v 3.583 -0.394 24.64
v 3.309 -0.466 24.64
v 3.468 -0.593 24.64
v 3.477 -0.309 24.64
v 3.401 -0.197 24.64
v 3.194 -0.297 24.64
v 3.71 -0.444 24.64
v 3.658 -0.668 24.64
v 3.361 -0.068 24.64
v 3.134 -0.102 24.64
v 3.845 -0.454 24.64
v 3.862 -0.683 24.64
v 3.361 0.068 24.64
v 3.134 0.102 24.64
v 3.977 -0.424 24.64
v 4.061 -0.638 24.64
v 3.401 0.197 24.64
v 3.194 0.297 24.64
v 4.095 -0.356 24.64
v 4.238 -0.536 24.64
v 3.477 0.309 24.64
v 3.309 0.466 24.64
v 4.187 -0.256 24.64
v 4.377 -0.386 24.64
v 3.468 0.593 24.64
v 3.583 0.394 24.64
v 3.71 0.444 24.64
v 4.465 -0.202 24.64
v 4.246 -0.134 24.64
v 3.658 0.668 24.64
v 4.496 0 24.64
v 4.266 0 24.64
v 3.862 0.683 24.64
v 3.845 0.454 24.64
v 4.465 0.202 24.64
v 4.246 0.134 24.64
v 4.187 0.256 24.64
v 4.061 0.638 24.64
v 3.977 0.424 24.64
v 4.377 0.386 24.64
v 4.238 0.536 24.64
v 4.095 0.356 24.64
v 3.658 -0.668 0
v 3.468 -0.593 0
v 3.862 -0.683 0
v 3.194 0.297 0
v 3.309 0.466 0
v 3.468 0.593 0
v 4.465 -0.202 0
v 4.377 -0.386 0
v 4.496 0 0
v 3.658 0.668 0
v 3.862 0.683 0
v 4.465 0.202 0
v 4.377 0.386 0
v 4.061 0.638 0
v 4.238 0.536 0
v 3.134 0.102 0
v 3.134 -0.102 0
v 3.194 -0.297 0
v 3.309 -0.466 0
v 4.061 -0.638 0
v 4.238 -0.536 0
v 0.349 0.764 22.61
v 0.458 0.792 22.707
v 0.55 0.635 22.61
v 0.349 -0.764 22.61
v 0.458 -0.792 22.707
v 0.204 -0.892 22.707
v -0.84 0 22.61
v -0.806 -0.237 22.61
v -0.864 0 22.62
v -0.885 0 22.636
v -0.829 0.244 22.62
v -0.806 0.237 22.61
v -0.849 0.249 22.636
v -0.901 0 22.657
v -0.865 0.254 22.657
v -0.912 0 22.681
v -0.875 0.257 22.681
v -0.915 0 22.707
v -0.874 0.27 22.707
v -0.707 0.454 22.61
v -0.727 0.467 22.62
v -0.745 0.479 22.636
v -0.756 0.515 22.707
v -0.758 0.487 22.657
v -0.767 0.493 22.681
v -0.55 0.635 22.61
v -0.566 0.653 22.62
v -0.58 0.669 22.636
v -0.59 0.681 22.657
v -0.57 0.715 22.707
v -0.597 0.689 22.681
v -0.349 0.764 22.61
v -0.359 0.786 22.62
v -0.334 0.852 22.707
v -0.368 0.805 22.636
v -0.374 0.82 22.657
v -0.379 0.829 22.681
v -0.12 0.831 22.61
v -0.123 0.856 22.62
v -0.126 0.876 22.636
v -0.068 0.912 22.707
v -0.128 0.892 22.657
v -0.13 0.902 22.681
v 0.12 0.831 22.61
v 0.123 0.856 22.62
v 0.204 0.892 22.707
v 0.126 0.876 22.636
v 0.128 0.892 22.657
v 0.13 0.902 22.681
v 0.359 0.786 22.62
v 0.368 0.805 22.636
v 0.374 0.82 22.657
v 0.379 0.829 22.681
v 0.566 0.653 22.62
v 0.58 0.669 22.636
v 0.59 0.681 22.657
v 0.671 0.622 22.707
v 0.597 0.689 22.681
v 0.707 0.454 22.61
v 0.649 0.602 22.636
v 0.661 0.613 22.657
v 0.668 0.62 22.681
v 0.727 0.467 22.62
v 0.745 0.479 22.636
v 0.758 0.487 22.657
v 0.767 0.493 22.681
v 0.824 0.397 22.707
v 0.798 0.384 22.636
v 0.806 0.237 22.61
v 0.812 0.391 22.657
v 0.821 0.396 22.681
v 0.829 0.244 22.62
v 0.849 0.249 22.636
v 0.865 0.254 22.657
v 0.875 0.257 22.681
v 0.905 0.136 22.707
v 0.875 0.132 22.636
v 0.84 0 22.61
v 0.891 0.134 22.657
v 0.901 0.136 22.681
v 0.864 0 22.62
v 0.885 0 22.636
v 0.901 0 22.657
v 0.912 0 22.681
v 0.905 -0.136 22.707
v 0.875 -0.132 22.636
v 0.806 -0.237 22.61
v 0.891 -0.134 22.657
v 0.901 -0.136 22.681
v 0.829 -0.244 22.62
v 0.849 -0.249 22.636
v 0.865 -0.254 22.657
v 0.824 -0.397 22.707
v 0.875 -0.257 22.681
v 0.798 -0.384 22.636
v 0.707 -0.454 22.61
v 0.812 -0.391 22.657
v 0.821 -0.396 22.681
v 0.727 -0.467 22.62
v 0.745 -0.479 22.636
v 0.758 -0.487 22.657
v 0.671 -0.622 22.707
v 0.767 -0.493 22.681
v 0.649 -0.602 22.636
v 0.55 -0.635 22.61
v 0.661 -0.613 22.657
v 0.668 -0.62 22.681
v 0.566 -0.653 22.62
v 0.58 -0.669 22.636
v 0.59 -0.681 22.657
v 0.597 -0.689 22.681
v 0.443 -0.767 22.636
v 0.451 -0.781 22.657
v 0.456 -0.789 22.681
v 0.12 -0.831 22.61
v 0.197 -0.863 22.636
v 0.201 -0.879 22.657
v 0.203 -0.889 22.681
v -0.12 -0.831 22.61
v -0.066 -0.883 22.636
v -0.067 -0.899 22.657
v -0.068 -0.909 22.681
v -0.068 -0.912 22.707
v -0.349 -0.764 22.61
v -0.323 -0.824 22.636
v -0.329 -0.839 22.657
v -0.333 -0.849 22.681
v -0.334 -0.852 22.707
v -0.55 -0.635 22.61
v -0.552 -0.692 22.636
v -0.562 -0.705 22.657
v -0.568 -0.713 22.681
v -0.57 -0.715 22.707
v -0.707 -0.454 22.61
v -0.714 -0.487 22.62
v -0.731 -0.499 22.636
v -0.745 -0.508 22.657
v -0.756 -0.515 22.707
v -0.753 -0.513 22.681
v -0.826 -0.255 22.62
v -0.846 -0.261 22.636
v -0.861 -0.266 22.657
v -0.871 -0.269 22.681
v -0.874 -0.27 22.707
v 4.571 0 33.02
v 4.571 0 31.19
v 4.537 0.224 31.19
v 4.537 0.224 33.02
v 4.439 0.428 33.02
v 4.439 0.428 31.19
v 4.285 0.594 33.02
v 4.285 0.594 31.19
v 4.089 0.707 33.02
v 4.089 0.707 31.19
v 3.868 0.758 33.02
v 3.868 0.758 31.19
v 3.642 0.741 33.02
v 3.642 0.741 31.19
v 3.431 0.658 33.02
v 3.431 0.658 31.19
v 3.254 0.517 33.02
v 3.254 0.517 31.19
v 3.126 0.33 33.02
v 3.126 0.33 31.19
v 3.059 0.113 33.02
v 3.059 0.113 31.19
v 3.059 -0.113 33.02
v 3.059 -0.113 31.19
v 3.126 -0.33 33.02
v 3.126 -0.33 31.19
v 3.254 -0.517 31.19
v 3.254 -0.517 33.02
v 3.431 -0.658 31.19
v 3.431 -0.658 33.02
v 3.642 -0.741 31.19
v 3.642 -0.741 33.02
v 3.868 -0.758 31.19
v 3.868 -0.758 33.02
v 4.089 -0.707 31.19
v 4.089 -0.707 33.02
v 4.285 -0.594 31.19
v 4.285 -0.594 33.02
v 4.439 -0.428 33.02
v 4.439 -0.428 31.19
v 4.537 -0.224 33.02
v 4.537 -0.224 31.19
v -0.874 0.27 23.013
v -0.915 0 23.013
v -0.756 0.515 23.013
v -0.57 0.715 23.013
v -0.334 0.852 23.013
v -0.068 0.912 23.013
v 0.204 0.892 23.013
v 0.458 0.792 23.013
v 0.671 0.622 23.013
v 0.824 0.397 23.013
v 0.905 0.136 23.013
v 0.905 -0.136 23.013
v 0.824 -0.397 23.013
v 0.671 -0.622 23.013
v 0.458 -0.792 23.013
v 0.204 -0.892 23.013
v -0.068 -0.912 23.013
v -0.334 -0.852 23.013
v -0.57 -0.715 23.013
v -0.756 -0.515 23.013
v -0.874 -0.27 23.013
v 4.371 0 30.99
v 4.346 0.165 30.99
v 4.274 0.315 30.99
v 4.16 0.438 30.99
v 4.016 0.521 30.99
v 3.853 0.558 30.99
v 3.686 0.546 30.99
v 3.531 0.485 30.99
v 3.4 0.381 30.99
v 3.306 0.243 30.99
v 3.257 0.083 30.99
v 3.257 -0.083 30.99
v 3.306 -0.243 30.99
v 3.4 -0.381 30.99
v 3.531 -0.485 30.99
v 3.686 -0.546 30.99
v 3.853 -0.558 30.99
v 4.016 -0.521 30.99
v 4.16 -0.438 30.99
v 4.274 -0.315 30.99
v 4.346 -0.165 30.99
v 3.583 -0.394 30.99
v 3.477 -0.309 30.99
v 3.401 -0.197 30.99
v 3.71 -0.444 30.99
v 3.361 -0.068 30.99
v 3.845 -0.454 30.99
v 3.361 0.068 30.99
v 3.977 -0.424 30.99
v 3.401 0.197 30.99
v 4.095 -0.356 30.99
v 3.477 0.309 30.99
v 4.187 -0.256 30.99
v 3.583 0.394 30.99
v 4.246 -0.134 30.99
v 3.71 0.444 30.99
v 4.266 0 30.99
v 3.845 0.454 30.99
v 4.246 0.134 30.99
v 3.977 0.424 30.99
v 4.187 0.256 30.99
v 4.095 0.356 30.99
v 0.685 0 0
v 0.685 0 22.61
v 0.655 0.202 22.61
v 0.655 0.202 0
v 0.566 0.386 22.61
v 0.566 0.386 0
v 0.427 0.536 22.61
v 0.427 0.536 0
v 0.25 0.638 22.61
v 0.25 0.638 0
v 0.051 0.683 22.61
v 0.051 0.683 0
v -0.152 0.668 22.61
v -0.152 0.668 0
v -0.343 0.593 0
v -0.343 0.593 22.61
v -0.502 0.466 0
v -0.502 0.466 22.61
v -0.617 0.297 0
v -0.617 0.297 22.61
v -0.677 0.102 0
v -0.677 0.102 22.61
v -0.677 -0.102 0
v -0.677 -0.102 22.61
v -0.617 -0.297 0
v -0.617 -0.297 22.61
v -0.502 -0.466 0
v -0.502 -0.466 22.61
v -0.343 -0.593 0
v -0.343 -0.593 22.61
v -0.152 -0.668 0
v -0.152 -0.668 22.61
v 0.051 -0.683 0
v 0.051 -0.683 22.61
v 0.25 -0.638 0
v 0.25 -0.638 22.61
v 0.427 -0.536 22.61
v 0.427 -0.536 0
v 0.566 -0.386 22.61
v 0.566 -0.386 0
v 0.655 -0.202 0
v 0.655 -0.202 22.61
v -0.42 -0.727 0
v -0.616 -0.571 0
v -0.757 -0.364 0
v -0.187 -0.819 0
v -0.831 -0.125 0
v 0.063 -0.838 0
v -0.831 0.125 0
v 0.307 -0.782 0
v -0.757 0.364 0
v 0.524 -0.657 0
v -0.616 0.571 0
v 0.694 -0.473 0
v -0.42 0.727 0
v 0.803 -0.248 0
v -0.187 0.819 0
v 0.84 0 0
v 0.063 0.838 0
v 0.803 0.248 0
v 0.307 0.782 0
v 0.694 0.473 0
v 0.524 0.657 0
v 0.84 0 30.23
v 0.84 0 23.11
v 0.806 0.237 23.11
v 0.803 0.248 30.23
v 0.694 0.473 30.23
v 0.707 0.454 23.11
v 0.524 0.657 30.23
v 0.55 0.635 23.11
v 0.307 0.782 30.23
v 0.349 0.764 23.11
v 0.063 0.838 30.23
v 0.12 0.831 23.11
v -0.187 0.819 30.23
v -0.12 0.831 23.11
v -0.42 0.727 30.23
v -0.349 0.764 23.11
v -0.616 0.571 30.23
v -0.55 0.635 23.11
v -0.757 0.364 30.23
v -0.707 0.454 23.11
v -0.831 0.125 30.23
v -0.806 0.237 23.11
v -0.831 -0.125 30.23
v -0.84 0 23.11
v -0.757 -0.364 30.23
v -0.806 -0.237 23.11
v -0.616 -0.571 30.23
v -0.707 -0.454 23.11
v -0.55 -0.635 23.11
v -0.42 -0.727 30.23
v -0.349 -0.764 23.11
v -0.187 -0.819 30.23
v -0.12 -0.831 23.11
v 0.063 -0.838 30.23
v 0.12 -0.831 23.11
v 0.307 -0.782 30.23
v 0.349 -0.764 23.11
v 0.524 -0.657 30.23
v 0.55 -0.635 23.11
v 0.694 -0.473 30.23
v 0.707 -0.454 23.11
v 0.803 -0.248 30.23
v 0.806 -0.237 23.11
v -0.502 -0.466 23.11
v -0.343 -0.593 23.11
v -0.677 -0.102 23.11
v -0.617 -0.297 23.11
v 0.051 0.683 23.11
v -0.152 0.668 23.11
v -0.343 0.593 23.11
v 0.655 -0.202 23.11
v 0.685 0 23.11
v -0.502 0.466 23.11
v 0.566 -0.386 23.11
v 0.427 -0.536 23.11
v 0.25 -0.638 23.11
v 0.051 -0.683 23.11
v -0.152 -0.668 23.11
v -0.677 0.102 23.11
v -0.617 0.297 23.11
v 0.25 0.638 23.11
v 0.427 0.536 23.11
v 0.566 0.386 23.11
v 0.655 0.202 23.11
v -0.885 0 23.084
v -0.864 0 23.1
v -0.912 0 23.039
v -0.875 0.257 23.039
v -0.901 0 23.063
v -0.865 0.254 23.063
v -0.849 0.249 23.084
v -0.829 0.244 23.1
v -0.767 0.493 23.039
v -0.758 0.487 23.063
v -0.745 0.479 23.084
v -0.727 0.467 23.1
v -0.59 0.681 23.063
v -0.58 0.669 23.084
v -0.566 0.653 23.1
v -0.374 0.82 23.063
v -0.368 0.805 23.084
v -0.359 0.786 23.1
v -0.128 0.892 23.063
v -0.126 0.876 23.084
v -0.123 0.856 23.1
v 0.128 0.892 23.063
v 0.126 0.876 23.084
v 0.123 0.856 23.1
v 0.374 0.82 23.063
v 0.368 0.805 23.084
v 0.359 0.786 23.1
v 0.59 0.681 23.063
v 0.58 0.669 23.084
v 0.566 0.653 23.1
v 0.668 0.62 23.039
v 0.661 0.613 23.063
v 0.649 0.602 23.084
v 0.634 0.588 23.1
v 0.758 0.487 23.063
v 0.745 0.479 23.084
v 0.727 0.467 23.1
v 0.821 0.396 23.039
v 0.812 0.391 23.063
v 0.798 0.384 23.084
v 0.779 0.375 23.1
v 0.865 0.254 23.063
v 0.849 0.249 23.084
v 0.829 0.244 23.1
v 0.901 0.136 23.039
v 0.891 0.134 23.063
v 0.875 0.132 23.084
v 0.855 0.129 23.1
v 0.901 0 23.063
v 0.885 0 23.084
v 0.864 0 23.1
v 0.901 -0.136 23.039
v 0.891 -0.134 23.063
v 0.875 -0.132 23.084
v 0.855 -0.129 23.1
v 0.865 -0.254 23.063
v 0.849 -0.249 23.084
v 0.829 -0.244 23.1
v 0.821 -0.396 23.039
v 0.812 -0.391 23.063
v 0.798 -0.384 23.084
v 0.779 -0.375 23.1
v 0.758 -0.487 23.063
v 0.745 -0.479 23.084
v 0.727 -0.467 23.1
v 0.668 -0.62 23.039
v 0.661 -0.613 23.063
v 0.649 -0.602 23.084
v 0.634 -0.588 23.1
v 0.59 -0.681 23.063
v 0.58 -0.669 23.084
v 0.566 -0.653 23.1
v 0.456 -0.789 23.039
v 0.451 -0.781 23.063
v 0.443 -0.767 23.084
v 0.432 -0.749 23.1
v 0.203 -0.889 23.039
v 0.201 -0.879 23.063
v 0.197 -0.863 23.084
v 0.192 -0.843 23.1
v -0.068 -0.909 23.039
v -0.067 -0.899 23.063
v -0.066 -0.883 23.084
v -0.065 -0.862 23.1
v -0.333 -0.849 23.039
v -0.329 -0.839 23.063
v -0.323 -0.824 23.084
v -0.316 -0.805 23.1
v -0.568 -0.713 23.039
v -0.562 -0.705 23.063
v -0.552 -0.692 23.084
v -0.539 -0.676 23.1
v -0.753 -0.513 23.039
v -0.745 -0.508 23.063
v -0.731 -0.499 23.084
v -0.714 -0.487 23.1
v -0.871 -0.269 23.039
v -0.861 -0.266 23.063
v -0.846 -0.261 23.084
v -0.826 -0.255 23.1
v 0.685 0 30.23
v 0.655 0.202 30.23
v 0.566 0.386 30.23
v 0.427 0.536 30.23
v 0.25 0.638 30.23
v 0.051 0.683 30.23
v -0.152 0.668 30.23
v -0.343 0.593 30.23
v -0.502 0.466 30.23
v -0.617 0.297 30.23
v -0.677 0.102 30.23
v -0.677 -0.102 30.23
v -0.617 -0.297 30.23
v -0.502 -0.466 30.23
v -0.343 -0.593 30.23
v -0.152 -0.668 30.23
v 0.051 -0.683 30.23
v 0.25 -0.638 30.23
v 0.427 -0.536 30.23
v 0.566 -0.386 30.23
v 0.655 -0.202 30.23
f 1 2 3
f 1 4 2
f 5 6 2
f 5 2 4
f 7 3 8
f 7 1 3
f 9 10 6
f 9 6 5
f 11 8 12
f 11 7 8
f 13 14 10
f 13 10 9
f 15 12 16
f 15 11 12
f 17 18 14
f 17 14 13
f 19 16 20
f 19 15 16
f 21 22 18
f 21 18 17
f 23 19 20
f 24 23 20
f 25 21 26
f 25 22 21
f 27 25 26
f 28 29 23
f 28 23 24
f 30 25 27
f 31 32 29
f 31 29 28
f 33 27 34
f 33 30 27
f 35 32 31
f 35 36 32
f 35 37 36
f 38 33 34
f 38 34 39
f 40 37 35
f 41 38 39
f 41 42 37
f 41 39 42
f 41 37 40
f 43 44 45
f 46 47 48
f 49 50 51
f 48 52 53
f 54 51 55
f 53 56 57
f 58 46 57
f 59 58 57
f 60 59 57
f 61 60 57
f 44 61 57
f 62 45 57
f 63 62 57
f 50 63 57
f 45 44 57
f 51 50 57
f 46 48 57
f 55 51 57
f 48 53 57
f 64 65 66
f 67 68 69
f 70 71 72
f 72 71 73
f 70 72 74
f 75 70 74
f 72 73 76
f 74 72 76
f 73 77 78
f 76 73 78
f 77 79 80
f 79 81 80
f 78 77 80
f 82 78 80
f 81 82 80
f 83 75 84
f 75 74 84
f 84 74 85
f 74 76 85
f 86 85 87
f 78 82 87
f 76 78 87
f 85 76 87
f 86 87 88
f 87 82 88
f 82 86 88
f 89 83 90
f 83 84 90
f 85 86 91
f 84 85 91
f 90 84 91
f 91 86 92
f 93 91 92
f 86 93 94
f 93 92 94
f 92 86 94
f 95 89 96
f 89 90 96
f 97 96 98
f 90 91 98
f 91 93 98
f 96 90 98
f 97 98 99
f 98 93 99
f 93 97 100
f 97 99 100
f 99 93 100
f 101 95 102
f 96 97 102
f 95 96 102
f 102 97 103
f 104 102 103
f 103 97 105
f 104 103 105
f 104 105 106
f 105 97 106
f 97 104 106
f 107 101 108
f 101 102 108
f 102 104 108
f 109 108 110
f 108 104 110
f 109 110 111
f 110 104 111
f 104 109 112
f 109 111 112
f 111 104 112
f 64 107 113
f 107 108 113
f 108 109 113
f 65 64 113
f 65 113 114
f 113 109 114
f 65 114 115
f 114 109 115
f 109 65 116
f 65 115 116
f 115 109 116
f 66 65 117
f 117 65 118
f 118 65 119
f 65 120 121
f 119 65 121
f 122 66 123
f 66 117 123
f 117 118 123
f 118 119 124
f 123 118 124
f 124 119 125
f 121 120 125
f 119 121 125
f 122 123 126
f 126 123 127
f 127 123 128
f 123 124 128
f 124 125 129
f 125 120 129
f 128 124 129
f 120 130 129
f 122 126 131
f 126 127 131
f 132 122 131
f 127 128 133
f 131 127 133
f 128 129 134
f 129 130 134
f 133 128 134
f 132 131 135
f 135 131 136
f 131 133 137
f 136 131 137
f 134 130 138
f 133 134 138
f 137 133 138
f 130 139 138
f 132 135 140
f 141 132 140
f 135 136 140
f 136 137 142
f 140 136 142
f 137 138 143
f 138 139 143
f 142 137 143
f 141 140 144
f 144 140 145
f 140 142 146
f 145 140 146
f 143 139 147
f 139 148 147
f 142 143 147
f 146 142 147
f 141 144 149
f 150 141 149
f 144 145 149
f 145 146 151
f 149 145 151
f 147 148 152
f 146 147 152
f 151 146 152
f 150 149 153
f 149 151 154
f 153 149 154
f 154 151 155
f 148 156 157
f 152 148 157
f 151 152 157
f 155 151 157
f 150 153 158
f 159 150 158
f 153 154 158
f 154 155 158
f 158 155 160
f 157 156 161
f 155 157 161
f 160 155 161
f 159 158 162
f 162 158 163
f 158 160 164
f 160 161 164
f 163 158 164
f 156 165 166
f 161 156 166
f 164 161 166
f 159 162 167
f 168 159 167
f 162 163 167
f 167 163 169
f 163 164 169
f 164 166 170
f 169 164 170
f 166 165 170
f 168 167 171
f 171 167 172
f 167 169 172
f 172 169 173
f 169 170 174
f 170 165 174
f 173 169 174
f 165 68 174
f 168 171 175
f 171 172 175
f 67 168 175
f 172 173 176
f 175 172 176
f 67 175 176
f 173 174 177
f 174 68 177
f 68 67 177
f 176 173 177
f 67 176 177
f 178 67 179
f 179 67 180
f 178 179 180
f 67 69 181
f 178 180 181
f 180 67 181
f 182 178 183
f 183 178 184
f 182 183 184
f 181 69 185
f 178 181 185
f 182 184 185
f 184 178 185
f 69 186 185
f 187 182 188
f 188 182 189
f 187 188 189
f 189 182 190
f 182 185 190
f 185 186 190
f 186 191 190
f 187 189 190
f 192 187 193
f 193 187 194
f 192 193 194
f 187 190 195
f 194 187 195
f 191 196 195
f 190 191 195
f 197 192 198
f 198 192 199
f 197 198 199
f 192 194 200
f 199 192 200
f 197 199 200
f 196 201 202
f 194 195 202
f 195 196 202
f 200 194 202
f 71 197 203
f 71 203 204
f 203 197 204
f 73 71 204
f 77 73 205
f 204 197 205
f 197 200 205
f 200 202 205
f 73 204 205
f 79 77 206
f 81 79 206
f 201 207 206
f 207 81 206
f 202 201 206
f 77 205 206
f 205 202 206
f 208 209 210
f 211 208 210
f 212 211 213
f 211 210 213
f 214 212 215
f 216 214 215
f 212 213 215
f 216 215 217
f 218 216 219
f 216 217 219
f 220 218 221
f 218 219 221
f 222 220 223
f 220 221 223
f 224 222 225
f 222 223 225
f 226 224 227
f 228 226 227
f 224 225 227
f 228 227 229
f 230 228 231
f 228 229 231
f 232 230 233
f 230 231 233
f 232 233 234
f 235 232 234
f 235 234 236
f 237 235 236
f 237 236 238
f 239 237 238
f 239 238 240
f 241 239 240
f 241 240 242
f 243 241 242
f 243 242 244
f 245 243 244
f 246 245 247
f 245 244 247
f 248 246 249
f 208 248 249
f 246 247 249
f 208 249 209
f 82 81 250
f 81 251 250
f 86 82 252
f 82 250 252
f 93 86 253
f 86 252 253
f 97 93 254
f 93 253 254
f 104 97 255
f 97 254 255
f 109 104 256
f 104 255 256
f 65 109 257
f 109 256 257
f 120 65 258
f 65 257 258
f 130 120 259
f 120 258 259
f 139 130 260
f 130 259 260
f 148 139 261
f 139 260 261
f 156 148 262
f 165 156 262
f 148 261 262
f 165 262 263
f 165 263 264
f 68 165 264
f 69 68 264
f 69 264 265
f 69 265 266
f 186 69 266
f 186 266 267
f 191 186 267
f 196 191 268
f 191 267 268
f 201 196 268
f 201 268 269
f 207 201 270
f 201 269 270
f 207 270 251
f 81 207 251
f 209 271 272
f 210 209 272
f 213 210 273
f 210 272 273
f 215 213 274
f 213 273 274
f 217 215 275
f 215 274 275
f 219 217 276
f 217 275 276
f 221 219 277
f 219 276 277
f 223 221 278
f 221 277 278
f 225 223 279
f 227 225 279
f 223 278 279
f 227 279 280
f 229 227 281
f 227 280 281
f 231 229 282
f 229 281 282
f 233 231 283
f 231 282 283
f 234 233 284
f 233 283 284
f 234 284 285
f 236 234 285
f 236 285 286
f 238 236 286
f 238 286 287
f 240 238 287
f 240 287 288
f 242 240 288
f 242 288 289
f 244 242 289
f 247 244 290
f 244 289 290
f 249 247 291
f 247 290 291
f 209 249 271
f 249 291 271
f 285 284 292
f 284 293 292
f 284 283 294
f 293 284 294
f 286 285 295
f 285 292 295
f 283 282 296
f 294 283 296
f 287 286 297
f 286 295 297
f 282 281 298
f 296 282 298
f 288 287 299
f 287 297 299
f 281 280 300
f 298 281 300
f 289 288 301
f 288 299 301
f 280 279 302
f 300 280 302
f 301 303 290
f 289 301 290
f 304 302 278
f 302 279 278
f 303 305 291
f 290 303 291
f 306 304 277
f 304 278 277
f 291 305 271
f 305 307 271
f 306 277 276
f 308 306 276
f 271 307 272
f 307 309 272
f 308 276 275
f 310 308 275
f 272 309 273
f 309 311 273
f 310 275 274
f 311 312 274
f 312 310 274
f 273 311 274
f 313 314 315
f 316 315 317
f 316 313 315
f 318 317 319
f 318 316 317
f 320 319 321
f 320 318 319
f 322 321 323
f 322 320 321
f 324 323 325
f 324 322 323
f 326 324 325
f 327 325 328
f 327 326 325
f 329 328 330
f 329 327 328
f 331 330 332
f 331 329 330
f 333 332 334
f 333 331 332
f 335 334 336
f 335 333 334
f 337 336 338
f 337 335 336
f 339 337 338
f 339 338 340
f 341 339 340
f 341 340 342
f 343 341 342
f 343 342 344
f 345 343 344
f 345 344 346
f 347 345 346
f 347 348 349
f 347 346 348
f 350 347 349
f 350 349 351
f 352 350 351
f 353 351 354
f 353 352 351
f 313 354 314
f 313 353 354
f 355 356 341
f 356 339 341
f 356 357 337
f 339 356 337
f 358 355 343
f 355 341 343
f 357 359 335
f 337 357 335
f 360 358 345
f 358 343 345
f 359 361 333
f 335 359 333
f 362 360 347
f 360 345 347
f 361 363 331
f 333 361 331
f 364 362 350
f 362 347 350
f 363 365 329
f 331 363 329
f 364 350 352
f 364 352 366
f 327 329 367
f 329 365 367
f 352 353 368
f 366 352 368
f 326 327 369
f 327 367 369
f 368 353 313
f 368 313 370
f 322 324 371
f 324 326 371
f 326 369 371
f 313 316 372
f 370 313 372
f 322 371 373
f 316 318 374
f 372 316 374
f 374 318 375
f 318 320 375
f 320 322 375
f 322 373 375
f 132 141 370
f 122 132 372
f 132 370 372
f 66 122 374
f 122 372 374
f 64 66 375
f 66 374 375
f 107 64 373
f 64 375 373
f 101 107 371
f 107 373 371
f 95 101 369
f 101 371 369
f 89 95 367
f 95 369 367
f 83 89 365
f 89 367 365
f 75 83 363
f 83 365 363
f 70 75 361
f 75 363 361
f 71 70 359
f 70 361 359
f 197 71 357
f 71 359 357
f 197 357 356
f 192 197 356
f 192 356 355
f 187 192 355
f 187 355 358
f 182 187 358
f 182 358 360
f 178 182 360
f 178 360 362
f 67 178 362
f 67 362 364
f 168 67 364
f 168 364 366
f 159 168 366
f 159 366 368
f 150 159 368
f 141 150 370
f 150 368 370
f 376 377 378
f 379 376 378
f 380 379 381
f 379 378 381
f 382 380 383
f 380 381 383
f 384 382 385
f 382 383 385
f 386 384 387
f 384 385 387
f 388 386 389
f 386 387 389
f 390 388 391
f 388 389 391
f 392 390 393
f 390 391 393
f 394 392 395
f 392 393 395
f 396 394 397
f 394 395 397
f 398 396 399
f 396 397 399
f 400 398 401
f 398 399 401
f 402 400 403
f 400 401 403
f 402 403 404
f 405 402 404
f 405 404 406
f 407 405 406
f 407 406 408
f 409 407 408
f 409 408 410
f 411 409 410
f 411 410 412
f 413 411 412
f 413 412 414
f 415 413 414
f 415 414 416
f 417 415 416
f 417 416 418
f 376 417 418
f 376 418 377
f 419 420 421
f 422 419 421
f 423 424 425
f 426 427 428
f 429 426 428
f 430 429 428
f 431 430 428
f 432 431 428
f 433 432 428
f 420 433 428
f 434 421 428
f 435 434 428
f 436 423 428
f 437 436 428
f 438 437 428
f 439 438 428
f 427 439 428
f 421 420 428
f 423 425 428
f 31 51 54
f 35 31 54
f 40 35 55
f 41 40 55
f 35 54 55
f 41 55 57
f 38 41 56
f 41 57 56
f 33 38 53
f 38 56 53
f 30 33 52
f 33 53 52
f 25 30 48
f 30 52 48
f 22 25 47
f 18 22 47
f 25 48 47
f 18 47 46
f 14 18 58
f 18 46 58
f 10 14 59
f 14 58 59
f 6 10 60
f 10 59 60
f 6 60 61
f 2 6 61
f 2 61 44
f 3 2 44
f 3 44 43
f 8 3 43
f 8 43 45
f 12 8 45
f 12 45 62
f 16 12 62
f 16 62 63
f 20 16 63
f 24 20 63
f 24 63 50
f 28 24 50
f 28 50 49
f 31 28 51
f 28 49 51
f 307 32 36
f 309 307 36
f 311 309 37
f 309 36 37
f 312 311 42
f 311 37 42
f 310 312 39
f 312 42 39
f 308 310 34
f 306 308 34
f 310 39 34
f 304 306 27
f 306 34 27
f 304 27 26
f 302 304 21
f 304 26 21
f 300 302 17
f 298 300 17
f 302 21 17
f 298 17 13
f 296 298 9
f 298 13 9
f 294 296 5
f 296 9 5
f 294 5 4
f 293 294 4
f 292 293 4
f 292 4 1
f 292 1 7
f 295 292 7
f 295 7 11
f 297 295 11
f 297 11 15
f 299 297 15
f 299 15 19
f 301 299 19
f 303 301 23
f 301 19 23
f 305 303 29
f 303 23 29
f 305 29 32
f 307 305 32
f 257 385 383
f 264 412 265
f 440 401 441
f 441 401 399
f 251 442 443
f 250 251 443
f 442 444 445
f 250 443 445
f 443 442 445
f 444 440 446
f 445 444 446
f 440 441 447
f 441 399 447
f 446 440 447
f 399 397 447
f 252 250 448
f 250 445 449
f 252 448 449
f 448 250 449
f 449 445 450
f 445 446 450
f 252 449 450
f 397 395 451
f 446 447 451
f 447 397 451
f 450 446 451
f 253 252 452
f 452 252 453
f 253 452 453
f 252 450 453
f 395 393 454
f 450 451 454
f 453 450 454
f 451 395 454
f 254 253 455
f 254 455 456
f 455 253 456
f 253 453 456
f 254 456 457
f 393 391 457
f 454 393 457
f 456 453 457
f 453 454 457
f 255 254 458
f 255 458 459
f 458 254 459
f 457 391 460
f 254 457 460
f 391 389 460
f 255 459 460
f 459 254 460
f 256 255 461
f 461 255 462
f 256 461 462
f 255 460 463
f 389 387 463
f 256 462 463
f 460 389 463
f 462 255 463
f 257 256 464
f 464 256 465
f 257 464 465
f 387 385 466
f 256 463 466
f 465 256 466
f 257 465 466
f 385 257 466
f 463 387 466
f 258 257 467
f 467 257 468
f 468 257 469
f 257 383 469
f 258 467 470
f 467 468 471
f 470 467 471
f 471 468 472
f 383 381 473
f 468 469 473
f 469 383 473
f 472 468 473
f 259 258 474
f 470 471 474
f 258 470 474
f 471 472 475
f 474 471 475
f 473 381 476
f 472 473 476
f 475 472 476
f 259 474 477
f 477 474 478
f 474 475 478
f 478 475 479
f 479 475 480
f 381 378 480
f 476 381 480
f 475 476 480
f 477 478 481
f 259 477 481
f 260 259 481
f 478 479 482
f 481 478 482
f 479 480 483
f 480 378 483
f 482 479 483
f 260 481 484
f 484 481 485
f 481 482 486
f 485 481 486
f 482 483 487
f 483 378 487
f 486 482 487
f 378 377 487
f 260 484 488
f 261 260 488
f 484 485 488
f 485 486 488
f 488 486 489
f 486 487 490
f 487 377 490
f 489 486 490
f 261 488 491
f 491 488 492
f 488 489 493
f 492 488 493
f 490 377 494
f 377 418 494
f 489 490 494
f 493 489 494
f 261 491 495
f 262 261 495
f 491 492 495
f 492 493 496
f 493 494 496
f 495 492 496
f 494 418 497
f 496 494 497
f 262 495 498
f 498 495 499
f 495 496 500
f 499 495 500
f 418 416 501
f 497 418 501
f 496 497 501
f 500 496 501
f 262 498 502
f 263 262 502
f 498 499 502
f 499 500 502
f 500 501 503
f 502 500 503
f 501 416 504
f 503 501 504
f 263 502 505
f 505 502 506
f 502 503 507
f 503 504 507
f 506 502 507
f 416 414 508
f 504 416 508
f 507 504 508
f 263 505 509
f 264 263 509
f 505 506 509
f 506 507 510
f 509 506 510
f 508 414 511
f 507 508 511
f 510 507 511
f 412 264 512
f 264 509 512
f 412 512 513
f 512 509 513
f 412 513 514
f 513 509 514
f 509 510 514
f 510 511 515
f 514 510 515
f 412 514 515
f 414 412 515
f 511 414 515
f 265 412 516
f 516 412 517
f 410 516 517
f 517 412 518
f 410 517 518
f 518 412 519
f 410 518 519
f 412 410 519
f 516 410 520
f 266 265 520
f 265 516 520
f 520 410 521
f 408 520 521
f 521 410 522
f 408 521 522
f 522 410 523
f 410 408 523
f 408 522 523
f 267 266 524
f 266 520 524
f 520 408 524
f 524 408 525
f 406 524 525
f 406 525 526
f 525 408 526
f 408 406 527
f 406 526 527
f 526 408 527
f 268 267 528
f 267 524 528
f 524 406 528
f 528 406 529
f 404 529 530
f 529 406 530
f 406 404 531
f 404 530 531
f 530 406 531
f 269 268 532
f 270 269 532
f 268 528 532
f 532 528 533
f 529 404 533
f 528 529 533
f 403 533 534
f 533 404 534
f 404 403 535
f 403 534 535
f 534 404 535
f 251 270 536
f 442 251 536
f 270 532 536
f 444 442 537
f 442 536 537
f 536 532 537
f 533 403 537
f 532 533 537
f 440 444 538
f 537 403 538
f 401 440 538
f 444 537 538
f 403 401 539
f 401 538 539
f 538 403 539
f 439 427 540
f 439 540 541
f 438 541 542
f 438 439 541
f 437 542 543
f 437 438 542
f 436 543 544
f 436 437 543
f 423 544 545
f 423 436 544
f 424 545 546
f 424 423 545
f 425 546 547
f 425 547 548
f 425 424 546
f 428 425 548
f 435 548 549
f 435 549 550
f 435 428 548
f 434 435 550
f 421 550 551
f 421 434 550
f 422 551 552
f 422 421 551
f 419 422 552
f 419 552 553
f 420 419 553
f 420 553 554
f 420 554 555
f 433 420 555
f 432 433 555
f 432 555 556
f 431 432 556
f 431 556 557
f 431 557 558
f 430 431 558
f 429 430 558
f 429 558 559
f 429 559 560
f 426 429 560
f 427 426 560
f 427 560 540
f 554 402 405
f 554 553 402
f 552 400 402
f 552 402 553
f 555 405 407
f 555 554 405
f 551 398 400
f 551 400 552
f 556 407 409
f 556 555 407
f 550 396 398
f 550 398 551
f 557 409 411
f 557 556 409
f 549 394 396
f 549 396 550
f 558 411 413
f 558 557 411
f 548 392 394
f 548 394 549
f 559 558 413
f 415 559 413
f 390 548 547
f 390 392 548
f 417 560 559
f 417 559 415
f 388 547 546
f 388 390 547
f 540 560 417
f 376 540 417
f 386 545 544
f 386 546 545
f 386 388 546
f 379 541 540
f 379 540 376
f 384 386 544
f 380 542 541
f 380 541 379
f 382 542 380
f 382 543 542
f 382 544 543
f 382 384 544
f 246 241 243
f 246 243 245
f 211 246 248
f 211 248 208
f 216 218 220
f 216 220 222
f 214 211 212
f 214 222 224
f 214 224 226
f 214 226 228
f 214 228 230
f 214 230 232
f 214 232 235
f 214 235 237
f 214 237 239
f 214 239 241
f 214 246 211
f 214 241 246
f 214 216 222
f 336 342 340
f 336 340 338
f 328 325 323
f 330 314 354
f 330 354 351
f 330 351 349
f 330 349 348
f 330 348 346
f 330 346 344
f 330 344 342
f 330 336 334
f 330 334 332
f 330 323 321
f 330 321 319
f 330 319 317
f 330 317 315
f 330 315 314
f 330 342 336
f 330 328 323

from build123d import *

# Parameters (mm, degrees)
F0_R     = 0.84
F0_R_2   = 0.685
F1_DEPTH = 30.23
F2_R     = 0.685
F3_DEPTH = 24.64
F4_R     = 0.455
F5_DEPTH = 6.35
F6_R     = 0.76
F7_DEPTH = 2.03
F8_SIZE  = 0.2
F9_W     = 0.915
F9_H     = 0.5


# Not quite as in the source:
# - a fillet or chamfer that OpenCascade refuses, or shapes differently, is made with other operations: its cross-section is extruded or revolved along the edge and cut away or added


with BuildPart() as f1:
    # F0 (on Top) → F1 (new body)
    with BuildSketch(Plane.XY):
        Circle(F0_R)
        Circle(F0_R_2, mode=Mode.SUBTRACT)
    extrude(amount=F1_DEPTH)

    # F9 (on Front) → F10 (revolve)
    with BuildSketch(Plane.XZ):
        with Locations((-0.4575, 22.86)):
            Rectangle(F9_W, F9_H)
    revolve(axis=Axis((0, 0, 22.86), (0, 0, -1)))

    # F11: fillet of radius 0.1 on 2 edges, made by hand

    # F11_s1 → F11_t2 (revolve, cut)
    with BuildSketch(Plane.XZ):
        with BuildLine():
            ThreePointArc((-0.915, 23.0131754163), (-0.8940569415, 23.0744126599), (-0.84, 23.11))
            Line((-0.84, 23.11), (-0.915, 23.11))
            Line((-0.915, 23.11), (-0.915, 23.0131754163))
        make_face()
    revolve(axis=Axis((0, 0, 23.11), (0, 0, -1)), mode=Mode.SUBTRACT)

    # F11_s3 → F11_t4 (revolve, cut)
    with BuildSketch(Plane.XZ):
        with BuildLine():
            ThreePointArc((-0.84, 22.61), (-0.8940569415, 22.6455873401), (-0.915, 22.7068245837))
            Line((-0.915, 22.7068245837), (-0.915, 22.61))
            Line((-0.915, 22.61), (-0.84, 22.61))
        make_face()
    revolve(axis=Axis((0, 0, 22.61), (0, 0, -1)), mode=Mode.SUBTRACT)


with BuildPart() as f3:
    # F2 (on Top) → F3 (new body)
    with BuildSketch(Plane.XY):
        with Locations((3.8109193556, 0)):
            Circle(F2_R)
    extrude(amount=F3_DEPTH)

    # F4 (on face) → F5 (join)
    with BuildSketch(Plane.XY.offset(24.64)):
        with Locations((3.8109193556, 0)):
            Circle(F4_R)
    extrude(amount=F5_DEPTH)

    # F6 (on face) → F7 (join)
    with BuildSketch(Plane.XY.offset(30.99)):
        with Locations((3.8109193556, 0)):
            Circle(F6_R)
    extrude(amount=F7_DEPTH)

    # F8
    f8_edges = [f3.edges().sort_by_distance(p)[0] for p in [
        (3.050919, 0, 30.99),
    ]]
    chamfer(f8_edges, length=F8_SIZE)


solid = Compound([f1.part, f3.part])
